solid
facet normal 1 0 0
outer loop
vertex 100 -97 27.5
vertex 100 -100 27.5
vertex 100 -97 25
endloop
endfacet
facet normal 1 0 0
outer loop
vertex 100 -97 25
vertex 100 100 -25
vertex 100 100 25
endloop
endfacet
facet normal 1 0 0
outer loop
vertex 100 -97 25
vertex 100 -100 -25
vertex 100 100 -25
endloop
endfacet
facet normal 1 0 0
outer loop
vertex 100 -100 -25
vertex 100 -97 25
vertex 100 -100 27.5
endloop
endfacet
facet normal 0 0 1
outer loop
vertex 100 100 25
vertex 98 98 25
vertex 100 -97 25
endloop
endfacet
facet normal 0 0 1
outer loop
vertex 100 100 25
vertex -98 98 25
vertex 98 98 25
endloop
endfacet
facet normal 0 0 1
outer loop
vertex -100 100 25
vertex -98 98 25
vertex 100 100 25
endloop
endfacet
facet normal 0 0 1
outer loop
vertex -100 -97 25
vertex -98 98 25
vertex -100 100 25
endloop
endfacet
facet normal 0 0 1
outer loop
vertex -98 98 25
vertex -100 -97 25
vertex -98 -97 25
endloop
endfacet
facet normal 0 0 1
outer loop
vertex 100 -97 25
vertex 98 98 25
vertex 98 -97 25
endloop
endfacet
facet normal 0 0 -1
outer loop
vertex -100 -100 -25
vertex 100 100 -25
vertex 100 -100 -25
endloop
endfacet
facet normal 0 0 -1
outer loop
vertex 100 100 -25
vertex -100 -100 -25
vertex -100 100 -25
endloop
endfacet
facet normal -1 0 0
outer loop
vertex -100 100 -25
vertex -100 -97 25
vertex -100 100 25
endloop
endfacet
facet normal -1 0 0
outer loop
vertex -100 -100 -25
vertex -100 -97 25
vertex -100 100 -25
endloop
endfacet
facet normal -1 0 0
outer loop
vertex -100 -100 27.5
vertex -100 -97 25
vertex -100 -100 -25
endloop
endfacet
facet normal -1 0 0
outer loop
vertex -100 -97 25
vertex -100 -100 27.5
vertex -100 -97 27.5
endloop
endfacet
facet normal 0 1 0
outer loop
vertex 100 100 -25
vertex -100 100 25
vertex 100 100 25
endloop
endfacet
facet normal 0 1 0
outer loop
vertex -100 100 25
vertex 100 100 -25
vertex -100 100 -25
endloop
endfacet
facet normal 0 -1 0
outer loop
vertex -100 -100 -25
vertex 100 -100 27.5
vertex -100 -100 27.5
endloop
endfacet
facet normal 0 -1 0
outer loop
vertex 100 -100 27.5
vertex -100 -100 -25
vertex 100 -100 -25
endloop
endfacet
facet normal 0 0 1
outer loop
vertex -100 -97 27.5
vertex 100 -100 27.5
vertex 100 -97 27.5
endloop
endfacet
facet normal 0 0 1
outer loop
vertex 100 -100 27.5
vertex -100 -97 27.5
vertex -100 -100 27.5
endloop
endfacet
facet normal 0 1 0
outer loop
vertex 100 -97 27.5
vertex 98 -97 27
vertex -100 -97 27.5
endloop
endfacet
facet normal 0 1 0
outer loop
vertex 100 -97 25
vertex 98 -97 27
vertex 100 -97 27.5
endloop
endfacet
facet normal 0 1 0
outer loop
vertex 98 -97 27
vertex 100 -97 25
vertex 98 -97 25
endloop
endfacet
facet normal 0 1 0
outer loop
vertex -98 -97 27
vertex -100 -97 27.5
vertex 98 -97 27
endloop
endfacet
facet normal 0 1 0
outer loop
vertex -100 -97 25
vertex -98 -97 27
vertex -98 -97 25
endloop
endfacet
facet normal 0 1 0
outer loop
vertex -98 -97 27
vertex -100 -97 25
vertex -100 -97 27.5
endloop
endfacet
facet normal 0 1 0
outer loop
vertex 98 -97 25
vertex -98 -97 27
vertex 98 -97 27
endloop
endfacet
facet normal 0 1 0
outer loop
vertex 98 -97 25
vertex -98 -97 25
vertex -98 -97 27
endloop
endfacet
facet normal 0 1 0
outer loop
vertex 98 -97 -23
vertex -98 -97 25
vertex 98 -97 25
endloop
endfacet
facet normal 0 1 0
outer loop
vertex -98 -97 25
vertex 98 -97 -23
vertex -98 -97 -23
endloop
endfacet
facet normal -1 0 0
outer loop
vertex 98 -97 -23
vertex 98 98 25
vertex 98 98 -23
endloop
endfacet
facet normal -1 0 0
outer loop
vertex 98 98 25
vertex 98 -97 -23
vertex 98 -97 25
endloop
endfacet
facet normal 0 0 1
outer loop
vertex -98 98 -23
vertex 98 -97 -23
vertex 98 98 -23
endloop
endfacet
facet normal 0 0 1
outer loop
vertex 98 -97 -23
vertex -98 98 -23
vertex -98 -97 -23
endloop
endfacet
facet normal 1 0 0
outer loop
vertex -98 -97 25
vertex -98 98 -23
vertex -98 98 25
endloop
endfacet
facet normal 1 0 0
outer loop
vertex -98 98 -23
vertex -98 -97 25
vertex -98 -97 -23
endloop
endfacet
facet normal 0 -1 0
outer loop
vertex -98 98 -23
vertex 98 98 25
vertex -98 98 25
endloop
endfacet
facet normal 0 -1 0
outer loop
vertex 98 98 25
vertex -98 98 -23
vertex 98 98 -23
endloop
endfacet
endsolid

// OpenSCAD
// file: boss.scad
$fn=50;
Dia=10;
height=2;

boss(Dia,height);

module boss(d,h){
    path=[[0,0],[0,height],[2*height,0]];
    rotate_extrude()translate([Dia/2,0,0])polygon(path);
    cylinder(d=Dia,h=height);
}
// file: flute.scad
helpText="flute(width=20,height=50,depth=2)";

flute(width=20,height=50,depth=2);
flute(help=true);
module flute(width=20,height=50,depth=2,help=false,center=true){
    $fn=50;
    R=(width*width)/(8*depth)+depth/2;
    if(help)echo(helpText);
    translate([0,depth-R,0])
    difference(){
        cylinder(h=height+2,r=R,center=true);
        translate([0,-(depth+0.05),0])cube([2*R,2*R,height+4],center=true);
    }
}
// main file
use<flute.scad>
use<boss.scad>
/* [Dimensions] */
width=200;
depth=200;
height=50;
fluted=true;
flute=[20,2];
runnerHeight=5;/* [Tab Thickness(sides,front,base)] */
thickness=[2,3,2];
knobs=1;    // [0:1:2] 

drawer(width,depth,height,thickness,fluted,flute,knobs);

module drawer(
    w=200,
    d=200,
    h=50,
    t=[2,3,2],
    fluted=true,
    flute=[20,2],
    knobs=1,
    rH=5){
    difference(){
        union(){
            cube([w,d,h],center=true);  //exterior
            translate([0,-(d-t[1])/2,h/2])cube([w,t[1],rH],center=true);
        }
        translate([0,(t[1]-t[0])/2,t[2]])
        cube([w-2*t[0],d-(t[0]+t[1]),h],center=true);  //interior
    }
}
